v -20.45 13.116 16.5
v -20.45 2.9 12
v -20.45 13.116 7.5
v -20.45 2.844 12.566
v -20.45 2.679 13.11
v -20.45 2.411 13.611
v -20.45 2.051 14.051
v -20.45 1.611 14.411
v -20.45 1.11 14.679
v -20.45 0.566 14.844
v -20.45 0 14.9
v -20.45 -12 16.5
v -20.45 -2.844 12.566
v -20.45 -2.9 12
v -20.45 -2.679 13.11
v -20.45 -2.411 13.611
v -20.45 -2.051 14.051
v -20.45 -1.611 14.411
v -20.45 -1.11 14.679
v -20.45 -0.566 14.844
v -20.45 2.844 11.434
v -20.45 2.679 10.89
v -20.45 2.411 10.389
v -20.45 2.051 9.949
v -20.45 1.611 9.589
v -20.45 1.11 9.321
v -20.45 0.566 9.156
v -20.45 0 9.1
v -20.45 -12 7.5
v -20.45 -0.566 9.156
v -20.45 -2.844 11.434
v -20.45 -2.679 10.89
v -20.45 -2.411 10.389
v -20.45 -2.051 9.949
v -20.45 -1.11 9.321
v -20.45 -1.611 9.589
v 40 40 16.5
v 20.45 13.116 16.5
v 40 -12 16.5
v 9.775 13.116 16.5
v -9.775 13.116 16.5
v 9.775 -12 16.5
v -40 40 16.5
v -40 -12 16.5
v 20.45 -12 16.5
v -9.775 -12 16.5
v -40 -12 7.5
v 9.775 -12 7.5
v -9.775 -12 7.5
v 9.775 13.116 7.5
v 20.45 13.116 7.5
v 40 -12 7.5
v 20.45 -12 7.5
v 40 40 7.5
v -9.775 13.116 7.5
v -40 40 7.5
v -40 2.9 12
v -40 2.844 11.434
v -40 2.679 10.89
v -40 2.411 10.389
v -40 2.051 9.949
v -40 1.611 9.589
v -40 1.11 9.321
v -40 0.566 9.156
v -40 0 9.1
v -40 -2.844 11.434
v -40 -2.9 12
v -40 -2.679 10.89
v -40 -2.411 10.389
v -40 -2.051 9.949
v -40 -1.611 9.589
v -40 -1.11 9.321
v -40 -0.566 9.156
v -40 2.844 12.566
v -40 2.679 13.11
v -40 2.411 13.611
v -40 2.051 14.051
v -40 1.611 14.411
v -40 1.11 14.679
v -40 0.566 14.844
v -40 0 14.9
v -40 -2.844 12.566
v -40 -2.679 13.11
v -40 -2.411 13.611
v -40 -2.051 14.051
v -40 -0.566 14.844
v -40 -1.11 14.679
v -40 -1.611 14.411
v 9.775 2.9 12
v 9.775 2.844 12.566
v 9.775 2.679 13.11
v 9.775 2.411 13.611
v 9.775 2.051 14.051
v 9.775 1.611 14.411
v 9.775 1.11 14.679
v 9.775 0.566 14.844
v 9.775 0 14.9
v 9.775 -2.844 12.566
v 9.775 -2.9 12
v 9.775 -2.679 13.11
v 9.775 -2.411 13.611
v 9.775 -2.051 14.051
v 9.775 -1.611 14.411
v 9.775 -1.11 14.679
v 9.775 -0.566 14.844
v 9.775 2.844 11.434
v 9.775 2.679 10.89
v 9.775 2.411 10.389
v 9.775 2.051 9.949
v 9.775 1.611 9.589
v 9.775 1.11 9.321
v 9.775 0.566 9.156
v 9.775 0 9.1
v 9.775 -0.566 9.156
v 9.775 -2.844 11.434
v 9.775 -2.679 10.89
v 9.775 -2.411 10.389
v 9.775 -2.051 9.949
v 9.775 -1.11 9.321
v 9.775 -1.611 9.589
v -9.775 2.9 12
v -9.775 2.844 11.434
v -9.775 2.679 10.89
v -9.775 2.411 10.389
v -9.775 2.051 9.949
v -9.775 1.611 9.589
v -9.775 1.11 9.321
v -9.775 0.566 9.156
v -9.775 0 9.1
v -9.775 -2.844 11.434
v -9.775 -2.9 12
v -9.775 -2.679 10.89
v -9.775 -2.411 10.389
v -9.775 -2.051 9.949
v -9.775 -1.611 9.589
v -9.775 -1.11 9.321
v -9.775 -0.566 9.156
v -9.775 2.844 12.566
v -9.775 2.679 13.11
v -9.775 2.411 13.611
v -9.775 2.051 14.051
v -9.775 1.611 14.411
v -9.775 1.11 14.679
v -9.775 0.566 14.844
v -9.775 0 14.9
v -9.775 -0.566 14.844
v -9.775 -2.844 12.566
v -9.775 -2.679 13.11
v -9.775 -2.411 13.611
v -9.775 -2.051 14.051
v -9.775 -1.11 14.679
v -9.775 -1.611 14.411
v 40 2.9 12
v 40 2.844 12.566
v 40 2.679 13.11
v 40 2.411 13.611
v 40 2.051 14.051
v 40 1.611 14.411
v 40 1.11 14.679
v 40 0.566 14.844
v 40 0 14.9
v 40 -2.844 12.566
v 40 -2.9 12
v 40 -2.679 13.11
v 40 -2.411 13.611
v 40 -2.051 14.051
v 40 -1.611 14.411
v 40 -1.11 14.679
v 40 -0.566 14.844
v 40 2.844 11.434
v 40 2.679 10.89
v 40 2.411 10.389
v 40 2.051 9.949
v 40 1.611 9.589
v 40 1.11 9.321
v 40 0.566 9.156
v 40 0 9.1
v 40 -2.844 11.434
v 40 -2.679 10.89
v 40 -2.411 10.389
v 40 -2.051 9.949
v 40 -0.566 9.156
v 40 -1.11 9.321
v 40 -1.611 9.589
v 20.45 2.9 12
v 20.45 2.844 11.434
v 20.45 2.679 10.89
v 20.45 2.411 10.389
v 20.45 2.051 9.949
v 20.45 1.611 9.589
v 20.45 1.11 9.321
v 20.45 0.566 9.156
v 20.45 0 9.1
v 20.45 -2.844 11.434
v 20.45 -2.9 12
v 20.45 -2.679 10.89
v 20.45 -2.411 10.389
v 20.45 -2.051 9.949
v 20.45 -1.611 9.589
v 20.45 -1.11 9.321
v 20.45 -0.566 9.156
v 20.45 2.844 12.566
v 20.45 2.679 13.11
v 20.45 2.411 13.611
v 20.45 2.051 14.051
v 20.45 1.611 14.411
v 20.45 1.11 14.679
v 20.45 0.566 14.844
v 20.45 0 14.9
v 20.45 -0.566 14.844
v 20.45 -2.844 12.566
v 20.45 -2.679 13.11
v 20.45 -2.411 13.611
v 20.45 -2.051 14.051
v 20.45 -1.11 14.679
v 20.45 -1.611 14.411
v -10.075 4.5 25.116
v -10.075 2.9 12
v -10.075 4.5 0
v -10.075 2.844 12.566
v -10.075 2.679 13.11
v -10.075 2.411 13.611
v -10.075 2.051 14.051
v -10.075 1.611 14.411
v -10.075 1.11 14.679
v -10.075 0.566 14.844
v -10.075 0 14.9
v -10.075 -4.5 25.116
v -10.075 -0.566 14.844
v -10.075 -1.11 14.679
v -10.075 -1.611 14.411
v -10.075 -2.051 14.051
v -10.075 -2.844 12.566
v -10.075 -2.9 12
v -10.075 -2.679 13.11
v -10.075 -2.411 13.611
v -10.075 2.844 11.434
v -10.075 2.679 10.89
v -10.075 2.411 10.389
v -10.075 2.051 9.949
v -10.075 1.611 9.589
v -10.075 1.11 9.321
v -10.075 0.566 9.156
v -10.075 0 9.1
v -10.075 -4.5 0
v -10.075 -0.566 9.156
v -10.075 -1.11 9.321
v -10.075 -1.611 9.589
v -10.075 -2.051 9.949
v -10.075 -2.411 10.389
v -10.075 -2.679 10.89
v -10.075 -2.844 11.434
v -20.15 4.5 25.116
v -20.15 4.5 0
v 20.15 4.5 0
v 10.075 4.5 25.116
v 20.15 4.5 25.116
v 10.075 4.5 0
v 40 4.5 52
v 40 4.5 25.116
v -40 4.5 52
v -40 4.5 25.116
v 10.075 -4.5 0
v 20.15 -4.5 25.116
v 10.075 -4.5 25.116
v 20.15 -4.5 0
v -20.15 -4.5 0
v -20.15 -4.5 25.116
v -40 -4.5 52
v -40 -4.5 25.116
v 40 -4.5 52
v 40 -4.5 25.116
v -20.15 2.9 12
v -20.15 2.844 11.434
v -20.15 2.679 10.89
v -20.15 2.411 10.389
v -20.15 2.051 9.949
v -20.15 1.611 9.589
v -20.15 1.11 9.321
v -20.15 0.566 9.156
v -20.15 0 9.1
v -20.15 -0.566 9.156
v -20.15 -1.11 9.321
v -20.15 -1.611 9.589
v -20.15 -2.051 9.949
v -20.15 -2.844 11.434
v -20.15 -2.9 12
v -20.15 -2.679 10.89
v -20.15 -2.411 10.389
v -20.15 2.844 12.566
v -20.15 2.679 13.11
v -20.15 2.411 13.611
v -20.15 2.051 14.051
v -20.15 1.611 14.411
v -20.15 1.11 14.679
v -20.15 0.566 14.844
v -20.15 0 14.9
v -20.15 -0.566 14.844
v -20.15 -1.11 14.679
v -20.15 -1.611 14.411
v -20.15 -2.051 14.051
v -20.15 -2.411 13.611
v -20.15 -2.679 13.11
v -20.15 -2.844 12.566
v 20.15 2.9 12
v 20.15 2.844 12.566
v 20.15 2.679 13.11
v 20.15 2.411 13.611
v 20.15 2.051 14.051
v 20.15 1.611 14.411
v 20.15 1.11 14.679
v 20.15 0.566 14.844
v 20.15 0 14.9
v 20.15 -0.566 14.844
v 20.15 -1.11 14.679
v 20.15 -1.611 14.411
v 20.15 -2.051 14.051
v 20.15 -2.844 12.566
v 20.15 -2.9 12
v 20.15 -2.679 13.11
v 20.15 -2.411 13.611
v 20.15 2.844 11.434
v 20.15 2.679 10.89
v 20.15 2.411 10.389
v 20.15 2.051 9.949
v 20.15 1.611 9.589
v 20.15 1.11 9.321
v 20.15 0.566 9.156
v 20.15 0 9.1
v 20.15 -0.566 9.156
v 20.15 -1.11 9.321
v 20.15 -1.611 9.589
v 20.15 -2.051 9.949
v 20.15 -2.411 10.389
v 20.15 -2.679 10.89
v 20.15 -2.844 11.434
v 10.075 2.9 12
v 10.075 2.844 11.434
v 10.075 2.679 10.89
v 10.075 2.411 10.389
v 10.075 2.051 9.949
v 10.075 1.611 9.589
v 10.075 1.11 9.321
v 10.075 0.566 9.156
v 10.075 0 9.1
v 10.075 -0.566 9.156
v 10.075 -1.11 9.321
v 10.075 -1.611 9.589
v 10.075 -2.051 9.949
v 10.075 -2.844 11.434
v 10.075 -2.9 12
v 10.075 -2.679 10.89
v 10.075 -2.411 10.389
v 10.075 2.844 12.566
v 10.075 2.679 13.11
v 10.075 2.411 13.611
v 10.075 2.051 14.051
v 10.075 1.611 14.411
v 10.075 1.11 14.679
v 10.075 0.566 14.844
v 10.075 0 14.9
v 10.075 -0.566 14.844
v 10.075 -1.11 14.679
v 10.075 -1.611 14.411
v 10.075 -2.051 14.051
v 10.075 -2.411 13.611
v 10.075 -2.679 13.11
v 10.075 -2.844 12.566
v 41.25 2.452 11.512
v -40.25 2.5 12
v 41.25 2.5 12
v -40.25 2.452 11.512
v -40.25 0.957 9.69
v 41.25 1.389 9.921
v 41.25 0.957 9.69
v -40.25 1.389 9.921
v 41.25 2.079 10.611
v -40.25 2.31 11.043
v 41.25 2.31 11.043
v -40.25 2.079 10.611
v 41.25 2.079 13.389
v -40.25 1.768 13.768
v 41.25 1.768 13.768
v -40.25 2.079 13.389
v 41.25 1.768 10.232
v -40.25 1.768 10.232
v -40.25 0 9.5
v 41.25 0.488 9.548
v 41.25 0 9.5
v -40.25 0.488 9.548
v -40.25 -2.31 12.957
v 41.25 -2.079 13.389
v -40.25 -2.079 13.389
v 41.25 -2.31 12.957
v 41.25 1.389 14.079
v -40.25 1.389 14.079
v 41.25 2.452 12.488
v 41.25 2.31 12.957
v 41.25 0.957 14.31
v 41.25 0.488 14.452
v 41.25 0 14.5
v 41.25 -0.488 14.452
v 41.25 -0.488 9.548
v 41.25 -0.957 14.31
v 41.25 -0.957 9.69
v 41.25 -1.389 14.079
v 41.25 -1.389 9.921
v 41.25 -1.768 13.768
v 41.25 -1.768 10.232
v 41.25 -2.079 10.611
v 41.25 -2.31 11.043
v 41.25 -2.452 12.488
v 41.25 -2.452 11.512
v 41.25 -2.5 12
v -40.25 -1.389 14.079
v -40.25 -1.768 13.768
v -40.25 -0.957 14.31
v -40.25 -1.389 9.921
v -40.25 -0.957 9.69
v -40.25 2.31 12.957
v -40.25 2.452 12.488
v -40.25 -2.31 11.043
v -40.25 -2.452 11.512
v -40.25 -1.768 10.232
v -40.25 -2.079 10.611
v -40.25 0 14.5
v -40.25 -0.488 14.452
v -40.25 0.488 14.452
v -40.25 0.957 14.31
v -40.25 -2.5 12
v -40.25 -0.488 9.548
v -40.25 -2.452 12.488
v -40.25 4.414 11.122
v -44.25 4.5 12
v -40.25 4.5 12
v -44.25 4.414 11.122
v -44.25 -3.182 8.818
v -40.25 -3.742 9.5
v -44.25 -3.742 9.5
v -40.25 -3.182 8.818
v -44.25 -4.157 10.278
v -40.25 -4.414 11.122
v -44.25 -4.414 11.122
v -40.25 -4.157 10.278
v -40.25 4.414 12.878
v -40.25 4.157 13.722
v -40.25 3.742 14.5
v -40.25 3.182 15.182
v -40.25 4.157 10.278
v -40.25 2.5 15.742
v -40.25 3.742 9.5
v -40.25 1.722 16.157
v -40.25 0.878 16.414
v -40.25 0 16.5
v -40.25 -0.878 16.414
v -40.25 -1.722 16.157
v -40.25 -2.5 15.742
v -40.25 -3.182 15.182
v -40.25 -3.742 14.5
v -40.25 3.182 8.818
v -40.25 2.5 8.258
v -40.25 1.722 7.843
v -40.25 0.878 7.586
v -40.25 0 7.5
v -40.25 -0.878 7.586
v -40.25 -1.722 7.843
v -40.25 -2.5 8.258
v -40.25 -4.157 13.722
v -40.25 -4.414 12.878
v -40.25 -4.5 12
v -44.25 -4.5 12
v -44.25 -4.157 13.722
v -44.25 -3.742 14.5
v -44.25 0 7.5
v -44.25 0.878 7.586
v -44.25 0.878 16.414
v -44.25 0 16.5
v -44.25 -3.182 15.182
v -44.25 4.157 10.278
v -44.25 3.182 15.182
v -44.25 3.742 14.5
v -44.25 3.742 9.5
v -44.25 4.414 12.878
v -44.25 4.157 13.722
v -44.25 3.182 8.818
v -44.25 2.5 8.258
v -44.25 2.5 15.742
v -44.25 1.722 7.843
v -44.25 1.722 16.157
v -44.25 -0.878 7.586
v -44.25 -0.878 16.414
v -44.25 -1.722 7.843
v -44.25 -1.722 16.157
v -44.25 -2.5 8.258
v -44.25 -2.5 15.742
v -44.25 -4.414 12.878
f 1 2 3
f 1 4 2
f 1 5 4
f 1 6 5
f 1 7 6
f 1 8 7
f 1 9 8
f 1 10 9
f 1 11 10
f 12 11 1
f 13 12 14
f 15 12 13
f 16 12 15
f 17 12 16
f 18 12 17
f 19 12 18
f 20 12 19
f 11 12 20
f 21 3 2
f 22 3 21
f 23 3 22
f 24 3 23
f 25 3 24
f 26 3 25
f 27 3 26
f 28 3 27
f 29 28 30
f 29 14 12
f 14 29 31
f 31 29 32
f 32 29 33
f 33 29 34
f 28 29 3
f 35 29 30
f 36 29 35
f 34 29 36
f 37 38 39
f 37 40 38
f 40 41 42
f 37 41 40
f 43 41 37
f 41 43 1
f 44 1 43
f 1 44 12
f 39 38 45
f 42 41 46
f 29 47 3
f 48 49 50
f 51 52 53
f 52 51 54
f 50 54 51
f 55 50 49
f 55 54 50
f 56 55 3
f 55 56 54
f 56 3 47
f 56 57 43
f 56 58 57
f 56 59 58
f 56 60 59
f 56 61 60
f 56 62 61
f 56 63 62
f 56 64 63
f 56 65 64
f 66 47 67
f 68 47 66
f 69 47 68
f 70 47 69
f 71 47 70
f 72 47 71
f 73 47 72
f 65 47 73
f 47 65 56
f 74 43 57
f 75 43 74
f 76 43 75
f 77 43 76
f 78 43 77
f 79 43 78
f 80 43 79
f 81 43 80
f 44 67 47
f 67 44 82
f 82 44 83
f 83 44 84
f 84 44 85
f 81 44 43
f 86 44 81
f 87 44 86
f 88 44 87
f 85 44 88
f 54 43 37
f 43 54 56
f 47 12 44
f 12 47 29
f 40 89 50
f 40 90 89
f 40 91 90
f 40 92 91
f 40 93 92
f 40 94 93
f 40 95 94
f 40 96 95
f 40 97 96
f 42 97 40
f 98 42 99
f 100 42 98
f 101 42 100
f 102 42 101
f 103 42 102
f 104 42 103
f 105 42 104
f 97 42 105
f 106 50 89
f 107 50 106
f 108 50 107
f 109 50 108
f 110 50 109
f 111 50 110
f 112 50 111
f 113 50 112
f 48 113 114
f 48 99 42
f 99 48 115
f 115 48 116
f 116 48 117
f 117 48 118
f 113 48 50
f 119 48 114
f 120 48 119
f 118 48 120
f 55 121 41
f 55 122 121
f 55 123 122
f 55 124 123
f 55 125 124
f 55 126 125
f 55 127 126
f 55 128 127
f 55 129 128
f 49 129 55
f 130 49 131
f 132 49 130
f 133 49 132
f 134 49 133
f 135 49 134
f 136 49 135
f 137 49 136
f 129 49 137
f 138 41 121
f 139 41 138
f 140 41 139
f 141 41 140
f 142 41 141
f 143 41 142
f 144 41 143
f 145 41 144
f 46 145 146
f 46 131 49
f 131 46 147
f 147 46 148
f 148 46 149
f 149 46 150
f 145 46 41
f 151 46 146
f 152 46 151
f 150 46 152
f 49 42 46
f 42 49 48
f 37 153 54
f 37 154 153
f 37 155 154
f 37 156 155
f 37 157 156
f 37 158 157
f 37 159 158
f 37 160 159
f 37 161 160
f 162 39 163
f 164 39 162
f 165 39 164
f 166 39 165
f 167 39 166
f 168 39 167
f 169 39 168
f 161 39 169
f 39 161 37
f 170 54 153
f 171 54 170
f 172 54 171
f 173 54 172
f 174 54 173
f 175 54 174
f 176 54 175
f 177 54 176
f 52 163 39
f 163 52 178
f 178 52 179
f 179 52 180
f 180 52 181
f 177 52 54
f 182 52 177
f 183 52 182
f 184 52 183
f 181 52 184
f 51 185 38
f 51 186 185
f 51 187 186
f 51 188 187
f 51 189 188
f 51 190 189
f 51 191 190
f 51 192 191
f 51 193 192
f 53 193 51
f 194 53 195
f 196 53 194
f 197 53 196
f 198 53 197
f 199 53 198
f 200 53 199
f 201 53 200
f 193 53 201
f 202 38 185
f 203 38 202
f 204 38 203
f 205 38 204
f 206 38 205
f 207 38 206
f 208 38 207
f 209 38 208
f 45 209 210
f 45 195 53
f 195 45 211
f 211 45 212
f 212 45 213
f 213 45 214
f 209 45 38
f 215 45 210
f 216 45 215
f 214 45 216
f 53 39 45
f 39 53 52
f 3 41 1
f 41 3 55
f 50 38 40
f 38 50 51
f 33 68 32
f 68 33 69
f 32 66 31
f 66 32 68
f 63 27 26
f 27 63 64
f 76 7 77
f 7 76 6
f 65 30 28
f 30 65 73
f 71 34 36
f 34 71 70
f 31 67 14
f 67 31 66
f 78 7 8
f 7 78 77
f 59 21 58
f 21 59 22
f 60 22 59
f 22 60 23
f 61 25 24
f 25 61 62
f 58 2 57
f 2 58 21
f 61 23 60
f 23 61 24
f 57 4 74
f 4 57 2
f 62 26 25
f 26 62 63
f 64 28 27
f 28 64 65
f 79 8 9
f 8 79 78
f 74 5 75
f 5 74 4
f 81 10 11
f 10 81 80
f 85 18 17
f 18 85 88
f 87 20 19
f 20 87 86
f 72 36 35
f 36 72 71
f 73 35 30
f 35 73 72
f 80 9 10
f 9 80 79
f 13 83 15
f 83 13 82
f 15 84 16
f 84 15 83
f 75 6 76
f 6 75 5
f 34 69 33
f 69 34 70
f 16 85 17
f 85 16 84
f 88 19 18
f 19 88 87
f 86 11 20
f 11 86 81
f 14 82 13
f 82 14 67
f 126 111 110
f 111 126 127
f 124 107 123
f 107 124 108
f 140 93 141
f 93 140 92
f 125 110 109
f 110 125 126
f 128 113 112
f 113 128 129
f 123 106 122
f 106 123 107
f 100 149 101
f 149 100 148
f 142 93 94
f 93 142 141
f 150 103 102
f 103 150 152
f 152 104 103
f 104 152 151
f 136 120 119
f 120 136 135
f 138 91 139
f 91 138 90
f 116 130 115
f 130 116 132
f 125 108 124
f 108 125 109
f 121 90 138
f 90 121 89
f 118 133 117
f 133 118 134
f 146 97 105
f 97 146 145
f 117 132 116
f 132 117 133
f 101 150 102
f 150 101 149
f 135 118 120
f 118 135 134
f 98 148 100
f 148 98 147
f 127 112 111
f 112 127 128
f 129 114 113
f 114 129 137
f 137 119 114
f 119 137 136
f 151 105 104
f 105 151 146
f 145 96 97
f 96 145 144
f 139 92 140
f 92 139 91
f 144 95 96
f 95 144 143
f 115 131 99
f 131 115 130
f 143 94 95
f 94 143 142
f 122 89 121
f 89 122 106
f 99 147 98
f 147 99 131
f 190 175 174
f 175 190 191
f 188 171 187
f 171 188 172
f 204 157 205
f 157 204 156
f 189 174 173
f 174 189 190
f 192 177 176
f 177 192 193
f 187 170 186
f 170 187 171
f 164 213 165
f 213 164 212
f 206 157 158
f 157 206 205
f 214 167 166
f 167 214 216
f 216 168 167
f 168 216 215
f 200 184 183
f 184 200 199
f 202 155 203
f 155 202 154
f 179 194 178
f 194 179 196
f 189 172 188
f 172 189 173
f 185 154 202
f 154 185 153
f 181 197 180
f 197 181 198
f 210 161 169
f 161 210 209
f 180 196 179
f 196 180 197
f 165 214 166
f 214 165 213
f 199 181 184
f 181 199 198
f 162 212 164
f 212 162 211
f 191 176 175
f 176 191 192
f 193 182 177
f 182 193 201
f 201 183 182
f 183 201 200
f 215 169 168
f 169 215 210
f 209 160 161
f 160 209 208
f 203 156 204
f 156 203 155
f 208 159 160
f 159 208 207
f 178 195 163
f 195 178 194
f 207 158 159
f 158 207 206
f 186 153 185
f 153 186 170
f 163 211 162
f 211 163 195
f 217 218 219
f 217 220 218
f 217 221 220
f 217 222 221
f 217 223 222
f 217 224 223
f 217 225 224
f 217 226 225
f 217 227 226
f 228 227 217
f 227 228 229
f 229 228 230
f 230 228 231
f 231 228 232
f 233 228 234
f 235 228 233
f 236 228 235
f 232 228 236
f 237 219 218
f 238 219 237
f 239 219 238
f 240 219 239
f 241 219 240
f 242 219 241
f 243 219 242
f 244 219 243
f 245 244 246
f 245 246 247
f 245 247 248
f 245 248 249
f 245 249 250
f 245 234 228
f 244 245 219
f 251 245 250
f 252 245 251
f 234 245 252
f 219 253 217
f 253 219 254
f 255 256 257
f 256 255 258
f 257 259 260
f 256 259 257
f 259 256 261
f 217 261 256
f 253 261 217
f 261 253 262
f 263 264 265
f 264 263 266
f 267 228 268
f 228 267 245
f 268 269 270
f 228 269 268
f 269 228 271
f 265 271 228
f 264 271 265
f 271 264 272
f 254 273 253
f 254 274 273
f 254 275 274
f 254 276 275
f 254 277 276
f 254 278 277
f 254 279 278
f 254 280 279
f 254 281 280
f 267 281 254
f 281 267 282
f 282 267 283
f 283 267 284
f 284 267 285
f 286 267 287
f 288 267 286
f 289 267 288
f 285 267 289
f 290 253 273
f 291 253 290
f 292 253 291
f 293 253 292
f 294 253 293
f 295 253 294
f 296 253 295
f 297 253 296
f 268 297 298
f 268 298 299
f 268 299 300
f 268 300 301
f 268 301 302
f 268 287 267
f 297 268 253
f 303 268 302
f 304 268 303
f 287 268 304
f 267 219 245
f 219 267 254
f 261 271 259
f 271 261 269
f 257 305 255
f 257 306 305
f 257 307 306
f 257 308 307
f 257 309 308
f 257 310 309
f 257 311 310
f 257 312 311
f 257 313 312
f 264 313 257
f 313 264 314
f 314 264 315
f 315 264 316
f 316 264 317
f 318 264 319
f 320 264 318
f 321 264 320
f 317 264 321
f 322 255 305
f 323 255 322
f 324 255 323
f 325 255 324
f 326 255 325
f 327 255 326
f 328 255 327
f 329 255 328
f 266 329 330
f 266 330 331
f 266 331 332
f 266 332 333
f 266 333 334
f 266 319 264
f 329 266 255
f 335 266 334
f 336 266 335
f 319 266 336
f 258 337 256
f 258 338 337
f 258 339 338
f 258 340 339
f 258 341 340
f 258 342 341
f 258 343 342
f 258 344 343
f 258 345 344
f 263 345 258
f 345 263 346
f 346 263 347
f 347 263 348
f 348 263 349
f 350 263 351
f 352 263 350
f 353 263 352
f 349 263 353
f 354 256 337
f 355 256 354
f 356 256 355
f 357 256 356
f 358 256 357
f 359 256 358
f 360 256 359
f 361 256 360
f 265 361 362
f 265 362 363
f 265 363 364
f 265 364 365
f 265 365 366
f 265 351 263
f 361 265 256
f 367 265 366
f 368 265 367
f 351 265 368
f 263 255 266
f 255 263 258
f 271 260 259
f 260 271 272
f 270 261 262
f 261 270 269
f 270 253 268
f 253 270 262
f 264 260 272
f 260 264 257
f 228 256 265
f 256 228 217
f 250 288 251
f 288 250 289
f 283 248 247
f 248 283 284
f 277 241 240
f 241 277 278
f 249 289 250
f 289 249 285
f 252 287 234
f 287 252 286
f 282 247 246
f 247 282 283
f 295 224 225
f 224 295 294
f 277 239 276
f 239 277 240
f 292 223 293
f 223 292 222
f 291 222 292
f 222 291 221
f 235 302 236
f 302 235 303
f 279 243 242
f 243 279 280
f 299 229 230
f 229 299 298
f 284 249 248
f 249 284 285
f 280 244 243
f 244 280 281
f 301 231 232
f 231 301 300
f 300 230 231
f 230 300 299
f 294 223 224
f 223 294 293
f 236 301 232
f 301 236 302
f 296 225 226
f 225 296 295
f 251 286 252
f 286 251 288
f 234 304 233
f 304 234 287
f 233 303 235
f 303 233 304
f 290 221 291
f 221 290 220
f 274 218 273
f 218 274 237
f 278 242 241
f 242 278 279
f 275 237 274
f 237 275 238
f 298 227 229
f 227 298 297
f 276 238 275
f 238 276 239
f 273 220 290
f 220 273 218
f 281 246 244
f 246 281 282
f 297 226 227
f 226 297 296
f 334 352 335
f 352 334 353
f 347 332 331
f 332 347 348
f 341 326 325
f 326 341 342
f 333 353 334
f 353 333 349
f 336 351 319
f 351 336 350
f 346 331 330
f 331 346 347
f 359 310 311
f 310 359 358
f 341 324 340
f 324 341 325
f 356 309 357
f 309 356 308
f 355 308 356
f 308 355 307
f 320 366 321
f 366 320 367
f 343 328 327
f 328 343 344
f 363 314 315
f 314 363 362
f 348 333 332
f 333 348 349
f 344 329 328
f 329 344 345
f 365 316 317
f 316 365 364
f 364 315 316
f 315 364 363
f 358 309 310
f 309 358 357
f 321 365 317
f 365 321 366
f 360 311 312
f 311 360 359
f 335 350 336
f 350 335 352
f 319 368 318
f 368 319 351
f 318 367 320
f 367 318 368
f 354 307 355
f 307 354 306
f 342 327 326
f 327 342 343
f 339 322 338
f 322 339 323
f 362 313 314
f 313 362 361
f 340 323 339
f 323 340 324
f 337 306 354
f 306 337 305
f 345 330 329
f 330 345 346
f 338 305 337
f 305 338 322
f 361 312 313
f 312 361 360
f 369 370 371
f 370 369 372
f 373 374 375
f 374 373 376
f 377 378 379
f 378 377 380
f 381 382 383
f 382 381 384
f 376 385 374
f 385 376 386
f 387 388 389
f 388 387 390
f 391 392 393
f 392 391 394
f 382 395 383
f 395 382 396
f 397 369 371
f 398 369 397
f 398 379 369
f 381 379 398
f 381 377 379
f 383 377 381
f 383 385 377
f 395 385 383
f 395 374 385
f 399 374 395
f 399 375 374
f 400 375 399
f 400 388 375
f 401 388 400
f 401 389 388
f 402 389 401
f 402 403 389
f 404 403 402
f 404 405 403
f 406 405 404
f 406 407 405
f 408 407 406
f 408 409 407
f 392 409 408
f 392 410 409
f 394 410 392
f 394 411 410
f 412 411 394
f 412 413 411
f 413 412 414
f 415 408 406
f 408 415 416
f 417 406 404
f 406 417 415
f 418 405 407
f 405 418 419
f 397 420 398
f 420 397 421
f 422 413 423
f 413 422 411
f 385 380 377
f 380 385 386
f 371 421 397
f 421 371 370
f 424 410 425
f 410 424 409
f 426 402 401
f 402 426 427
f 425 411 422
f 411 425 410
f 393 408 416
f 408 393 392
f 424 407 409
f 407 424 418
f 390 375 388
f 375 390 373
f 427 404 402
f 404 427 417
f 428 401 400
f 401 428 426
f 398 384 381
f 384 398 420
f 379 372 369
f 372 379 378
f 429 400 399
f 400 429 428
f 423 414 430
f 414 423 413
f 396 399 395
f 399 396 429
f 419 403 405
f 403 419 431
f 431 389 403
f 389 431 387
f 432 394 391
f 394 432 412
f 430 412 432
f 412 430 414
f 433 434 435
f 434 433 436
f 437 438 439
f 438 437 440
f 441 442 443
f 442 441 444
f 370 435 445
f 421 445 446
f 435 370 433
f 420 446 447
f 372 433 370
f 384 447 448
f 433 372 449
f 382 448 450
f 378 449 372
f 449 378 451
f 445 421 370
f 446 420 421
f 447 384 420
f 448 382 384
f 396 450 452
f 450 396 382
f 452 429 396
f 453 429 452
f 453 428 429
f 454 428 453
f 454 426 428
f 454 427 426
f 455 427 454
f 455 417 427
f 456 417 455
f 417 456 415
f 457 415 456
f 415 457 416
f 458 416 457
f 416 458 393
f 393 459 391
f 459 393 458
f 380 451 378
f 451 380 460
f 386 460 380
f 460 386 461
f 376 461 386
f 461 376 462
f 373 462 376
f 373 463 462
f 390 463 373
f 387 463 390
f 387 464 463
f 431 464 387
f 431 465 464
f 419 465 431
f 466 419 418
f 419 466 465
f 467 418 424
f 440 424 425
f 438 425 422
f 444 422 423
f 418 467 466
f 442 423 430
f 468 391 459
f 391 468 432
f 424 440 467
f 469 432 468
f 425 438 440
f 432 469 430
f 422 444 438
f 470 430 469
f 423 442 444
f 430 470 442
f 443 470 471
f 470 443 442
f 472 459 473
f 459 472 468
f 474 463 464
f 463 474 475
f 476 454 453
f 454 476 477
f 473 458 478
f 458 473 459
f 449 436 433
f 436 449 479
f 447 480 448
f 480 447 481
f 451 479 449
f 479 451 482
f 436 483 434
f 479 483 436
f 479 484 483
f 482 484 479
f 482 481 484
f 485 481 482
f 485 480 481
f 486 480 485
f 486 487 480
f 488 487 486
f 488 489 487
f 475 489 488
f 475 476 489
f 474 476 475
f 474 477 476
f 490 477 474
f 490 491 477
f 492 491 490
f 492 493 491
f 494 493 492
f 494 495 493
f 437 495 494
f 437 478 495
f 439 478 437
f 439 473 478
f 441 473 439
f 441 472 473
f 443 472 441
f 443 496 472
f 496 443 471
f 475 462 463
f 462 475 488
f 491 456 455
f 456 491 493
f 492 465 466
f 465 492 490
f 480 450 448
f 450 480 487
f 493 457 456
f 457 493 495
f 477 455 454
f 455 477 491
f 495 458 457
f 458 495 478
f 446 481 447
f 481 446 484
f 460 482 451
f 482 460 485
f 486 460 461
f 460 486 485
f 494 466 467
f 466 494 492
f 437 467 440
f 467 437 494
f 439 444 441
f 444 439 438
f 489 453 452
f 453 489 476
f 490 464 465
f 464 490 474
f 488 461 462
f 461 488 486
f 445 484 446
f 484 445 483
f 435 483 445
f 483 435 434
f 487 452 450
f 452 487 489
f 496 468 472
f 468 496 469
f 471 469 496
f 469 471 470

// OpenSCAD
$fn = 32;

// ------------------------------------------------------------------------
// Butt hinge: hinge 80 mm, leaf swung 270 deg
// Every part is its own module, assembly() places every instance.
// ------------------------------------------------------------------------

// --- part 1 ---
module hinge_base() {
  difference() {
    union() {
      translate([-40, -12, -4.5]) cube([19.55, 52, 9]);
      translate([-9.775, -12, -4.5]) cube([19.55, 52, 9]);
      translate([20.45, -12, -4.5]) cube([19.55, 52, 9]);
      translate([-40, 13.116, -4.5]) cube([80, 26.884, 9]);
    }
    translate([-30.225, 0, 0]) rotate([0, 90, 0]) cylinder(h = 21.55, d = 5.8, center = true);
    translate([0, 0, 0]) rotate([0, 90, 0]) cylinder(h = 21.55, d = 5.8, center = true);
    translate([30.225, 0, 0]) rotate([0, 90, 0]) cylinder(h = 21.55, d = 5.8, center = true);
  }
}

// --- part 2 ---
module hinge_mover() {
  difference() {
    union() {
      translate([-20.15, -40, -4.5]) cube([10.075, 52, 9]);
      translate([10.075, -40, -4.5]) cube([10.075, 52, 9]);
      translate([-40, -40, -4.5]) cube([80, 26.884, 9]);
    }
    translate([-15.113, 0, 0]) rotate([0, 90, 0]) cylinder(h = 12.075, d = 5.8, center = true);
    translate([15.113, 0, 0]) rotate([0, 90, 0]) cylinder(h = 12.075, d = 5.8, center = true);
  }
}

// --- part 3 ---
module hinge_pin() {
  rotate([0, 90, 0]) cylinder(h = 82.5, d = 5, center = true);
  translate([-44.25, 0, 0]) rotate([0, 90, 0]) cylinder(h = 4, d = 9);
}

// --- assembly ---
module assembly() {
  color([0.80, 0.24, 0.20]) translate([0, 0, 12]) rotate([0, 0, 0]) hinge_base();
  color([0.20, 0.45, 0.75]) translate([0, 0, 12]) rotate([270, 0, 0]) hinge_mover();
  color([0.25, 0.62, 0.32]) translate([0, 0, 12]) rotate([0, 0, 0]) hinge_pin();
}

assembly();
